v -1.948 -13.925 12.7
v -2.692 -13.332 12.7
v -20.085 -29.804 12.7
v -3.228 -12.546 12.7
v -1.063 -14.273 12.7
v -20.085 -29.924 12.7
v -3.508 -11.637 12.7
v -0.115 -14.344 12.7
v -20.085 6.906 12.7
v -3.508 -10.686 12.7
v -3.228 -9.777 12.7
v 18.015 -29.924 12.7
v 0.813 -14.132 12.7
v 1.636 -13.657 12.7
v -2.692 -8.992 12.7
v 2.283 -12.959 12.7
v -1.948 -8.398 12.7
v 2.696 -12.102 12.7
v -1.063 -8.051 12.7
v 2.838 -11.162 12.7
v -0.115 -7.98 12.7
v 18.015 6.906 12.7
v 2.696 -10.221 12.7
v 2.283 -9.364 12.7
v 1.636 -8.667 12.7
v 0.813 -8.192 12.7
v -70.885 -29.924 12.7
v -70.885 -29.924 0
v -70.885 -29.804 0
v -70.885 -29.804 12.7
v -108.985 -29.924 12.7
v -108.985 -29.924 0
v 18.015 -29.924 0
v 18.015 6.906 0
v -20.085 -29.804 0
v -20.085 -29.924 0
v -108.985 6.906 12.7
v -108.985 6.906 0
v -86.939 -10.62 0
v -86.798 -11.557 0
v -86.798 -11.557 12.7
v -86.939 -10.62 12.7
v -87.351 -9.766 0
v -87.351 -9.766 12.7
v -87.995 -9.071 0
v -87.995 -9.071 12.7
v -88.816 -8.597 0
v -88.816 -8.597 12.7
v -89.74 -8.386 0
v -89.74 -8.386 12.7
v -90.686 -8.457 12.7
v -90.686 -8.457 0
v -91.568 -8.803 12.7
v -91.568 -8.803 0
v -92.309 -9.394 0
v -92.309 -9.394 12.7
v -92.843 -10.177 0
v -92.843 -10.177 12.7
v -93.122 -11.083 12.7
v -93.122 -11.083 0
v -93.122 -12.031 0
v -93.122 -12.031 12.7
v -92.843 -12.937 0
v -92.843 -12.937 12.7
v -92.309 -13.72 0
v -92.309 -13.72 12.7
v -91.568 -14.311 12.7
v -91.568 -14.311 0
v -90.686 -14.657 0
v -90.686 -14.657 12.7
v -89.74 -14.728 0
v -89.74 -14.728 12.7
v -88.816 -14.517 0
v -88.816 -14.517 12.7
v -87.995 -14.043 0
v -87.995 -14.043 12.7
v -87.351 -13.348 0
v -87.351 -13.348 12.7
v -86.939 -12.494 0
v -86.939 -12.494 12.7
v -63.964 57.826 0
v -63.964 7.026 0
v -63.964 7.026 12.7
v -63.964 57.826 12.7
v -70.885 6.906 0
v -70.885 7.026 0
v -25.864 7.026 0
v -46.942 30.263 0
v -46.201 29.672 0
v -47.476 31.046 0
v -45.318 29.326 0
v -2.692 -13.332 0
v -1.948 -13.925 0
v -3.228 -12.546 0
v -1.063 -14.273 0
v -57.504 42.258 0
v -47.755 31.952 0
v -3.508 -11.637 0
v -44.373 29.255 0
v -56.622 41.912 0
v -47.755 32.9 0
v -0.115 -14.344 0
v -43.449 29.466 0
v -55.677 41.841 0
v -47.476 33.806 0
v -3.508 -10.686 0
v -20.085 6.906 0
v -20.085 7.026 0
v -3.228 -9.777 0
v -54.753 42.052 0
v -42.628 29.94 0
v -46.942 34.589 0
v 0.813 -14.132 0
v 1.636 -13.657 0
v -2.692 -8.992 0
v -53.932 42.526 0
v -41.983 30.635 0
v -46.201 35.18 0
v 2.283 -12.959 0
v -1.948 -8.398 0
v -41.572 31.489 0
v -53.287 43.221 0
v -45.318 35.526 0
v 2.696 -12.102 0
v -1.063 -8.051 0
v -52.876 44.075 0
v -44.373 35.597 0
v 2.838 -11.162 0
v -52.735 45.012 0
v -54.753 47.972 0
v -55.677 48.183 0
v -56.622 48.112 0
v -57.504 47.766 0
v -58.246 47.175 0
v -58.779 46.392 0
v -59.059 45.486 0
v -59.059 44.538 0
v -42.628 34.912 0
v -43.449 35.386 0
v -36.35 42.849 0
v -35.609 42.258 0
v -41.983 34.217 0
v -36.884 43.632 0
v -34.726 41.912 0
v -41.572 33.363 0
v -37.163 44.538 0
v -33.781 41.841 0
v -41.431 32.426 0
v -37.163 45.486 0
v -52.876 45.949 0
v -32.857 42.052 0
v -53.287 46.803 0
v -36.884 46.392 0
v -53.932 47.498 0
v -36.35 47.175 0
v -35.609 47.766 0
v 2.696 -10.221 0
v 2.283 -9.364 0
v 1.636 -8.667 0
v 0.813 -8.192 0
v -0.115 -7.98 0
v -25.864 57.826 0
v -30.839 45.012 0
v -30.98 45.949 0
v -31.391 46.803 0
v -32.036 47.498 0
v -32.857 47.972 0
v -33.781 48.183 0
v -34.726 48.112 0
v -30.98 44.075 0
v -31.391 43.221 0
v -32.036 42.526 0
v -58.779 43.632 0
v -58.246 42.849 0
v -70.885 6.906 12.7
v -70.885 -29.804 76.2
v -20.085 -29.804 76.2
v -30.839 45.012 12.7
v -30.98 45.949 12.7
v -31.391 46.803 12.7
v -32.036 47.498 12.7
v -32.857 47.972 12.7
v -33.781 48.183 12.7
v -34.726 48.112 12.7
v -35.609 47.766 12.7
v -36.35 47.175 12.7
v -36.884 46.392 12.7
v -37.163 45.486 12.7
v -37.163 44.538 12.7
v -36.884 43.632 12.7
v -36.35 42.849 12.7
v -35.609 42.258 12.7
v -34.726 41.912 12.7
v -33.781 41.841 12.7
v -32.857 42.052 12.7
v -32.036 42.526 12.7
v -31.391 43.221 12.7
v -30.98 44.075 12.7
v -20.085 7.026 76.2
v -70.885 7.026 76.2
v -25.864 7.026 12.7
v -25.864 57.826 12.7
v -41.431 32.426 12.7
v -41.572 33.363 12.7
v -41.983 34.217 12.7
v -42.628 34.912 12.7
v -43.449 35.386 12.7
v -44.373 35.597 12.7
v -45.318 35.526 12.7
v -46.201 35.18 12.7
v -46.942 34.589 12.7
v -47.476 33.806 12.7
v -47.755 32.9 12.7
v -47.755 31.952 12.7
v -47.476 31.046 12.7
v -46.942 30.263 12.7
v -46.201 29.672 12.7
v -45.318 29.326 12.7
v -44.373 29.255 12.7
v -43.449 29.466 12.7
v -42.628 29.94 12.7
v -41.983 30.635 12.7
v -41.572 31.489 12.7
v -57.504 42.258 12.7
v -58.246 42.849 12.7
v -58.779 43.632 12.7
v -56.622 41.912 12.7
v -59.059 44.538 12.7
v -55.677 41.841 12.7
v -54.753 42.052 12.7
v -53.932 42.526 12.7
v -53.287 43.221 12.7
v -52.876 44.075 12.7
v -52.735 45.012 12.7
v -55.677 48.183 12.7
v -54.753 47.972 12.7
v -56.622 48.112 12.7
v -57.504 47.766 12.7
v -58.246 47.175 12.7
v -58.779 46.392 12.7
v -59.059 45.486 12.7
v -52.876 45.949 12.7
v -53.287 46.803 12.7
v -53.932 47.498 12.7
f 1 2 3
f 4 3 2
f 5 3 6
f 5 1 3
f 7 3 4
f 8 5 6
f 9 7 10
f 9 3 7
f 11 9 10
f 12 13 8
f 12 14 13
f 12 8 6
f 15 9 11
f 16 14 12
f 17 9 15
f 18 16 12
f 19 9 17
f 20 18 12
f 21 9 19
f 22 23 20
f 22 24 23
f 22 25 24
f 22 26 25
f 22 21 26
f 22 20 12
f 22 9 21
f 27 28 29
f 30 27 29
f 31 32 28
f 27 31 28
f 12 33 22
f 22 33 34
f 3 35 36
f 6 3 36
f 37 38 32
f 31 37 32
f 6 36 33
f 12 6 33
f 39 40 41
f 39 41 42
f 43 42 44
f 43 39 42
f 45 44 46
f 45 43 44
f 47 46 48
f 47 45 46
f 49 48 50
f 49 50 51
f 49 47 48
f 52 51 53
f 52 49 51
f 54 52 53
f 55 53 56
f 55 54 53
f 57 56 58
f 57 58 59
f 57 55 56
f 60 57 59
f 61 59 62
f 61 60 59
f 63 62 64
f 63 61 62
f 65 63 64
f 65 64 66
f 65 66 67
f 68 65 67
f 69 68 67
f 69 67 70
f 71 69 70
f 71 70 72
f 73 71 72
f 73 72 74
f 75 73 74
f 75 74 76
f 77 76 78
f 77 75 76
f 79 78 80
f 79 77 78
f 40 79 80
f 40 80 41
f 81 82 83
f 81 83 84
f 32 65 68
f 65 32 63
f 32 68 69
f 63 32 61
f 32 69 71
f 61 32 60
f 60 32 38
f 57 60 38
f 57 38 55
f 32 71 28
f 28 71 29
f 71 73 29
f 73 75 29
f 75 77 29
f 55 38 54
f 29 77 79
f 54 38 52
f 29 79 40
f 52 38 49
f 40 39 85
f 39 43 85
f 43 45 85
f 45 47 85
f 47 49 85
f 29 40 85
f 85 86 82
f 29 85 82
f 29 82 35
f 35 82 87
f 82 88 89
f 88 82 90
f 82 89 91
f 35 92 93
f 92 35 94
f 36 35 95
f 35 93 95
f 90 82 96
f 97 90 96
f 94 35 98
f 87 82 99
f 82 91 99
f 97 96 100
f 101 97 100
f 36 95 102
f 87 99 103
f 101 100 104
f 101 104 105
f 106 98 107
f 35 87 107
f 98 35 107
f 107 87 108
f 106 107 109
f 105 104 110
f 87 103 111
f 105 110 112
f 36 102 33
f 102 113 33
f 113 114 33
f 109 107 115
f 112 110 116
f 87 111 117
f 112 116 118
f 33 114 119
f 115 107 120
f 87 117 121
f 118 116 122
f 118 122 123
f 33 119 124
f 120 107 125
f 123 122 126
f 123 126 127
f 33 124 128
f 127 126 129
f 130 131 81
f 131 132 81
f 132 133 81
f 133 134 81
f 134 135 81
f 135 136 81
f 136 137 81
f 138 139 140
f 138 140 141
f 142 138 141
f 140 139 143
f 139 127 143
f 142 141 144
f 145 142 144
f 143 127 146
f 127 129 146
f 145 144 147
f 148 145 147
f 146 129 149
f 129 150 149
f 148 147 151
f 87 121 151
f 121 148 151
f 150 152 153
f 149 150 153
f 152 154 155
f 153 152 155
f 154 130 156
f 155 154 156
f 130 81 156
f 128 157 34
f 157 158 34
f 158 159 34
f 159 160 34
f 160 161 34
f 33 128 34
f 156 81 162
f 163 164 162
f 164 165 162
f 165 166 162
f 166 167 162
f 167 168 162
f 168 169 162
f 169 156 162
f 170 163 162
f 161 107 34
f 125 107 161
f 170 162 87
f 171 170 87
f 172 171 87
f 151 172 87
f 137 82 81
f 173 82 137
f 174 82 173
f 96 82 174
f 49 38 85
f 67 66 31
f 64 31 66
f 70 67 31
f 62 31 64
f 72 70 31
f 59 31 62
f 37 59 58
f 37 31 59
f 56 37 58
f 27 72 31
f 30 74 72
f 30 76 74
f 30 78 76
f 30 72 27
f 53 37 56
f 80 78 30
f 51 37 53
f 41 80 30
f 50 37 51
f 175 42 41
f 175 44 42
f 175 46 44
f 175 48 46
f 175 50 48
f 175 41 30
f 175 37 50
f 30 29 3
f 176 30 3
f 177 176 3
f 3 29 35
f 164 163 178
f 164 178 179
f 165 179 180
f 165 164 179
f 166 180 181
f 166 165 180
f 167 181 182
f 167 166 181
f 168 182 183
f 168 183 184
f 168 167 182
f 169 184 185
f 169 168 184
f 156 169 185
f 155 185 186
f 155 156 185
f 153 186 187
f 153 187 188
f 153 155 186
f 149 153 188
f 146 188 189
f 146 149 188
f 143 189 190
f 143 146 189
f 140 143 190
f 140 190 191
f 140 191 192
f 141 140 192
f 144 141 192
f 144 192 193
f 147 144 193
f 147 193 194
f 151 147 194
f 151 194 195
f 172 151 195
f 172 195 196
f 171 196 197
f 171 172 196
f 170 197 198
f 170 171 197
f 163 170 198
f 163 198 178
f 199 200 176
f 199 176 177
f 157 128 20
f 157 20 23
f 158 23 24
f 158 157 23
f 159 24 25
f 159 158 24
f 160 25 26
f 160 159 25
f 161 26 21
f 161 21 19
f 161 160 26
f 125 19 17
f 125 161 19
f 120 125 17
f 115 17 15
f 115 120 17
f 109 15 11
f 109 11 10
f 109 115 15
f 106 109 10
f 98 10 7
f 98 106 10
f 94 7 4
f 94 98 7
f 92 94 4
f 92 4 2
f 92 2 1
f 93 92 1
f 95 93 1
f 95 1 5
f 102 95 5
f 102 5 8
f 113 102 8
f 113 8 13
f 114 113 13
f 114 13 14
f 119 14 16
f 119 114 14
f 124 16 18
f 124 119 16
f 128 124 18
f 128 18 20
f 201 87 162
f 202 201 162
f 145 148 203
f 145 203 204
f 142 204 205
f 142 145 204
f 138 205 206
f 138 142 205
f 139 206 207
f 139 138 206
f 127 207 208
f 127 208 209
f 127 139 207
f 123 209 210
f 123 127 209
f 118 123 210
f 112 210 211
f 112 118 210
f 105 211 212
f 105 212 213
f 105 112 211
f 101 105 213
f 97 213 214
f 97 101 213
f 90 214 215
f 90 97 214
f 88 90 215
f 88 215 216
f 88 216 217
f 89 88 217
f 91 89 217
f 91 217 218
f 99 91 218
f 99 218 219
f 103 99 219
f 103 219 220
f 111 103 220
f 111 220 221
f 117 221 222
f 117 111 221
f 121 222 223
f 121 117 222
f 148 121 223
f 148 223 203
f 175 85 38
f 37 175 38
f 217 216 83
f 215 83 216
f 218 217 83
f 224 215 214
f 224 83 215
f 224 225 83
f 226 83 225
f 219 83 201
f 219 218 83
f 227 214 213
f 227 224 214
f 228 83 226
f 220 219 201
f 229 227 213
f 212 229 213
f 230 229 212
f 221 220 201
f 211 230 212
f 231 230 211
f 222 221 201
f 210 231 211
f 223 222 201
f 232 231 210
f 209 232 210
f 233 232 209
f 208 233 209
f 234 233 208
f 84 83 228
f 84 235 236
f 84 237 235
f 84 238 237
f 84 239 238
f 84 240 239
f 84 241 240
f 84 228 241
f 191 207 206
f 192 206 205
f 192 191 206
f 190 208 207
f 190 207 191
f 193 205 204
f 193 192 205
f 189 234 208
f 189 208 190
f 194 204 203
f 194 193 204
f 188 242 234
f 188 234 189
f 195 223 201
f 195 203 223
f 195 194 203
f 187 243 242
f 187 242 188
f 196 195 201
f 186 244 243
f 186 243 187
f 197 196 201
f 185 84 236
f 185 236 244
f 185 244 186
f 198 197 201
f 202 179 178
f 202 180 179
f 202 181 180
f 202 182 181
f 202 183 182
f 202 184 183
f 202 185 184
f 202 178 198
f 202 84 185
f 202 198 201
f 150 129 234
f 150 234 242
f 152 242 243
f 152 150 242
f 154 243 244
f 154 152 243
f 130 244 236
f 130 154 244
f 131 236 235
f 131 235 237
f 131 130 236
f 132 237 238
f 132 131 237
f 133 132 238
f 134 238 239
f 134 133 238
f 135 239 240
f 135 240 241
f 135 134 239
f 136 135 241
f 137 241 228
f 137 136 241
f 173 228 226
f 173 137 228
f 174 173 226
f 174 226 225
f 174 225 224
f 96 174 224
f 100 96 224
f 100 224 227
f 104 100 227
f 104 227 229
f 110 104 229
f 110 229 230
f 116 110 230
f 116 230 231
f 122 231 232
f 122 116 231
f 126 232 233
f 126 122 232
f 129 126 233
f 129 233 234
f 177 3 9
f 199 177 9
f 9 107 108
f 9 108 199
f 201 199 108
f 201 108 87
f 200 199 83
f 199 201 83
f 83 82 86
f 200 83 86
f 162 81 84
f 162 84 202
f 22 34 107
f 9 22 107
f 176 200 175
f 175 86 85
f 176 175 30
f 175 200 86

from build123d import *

# Parameters (mm, degrees)
F1_DEPTH = 76.2
F0_R     = 3.17989
F2_DEPTH = 12.7
F0_R_2   = 3.190914
F3_DEPTH = 12.7
F0_W     = 38.1
F0_H     = 50.8
F4_DEPTH = 12.7


with BuildPart() as f1:
    # F0 (on Top) → F1 (new body)
    with BuildSketch(Plane.XY):
        Polygon((-63.963963, 7.02602), (-70.885196, 7.02602), (-70.885196, 6.905661), (-70.885196, -29.80398), (-20.085196, -29.80398), (-20.085196, 6.905661), (-20.085196, 7.02602), (-25.863963, 7.02602), align=None)
    extrude(amount=F1_DEPTH)

    # F0 (on Top) → F2 (join)
    with BuildSketch(Plane.XY):
        Polygon((-70.885196, -29.80398), (-70.885196, 6.905661), (-108.985196, 6.905661), (-108.985196, -29.924339), (-70.885196, -29.924339), align=None)
        with Locations((-89.978054, -11.557001)):
            Circle(F0_R, mode=Mode.SUBTRACT)
    extrude(amount=F2_DEPTH)

    # F0 (on Top) → F3 (join)
    with BuildSketch(Plane.XY):
        Polygon((-20.085196, 6.905661), (-20.085196, -29.80398), (-20.085196, -29.924339), (18.014804, -29.924339), (18.014804, 6.905661), align=None)
        with Locations((-0.353005, -11.161889)):
            Circle(F0_R_2, mode=Mode.SUBTRACT)
    extrude(amount=F3_DEPTH)

    # F0 (on Top) → F4 (join)
    with BuildSketch(Plane.XY):
        with Locations((-44.913963, 32.42602)):
            Rectangle(F0_W, F0_H)
        with Locations((-55.91448, 45.011953)):
            Circle(F0_R, mode=Mode.SUBTRACT)
        with Locations((-44.610804, 32.42602)):
            Circle(F0_R, mode=Mode.SUBTRACT)
        with Locations((-34.018744, 45.011953)):
            Circle(F0_R, mode=Mode.SUBTRACT)
    extrude(amount=F4_DEPTH)


solid = f1.part
